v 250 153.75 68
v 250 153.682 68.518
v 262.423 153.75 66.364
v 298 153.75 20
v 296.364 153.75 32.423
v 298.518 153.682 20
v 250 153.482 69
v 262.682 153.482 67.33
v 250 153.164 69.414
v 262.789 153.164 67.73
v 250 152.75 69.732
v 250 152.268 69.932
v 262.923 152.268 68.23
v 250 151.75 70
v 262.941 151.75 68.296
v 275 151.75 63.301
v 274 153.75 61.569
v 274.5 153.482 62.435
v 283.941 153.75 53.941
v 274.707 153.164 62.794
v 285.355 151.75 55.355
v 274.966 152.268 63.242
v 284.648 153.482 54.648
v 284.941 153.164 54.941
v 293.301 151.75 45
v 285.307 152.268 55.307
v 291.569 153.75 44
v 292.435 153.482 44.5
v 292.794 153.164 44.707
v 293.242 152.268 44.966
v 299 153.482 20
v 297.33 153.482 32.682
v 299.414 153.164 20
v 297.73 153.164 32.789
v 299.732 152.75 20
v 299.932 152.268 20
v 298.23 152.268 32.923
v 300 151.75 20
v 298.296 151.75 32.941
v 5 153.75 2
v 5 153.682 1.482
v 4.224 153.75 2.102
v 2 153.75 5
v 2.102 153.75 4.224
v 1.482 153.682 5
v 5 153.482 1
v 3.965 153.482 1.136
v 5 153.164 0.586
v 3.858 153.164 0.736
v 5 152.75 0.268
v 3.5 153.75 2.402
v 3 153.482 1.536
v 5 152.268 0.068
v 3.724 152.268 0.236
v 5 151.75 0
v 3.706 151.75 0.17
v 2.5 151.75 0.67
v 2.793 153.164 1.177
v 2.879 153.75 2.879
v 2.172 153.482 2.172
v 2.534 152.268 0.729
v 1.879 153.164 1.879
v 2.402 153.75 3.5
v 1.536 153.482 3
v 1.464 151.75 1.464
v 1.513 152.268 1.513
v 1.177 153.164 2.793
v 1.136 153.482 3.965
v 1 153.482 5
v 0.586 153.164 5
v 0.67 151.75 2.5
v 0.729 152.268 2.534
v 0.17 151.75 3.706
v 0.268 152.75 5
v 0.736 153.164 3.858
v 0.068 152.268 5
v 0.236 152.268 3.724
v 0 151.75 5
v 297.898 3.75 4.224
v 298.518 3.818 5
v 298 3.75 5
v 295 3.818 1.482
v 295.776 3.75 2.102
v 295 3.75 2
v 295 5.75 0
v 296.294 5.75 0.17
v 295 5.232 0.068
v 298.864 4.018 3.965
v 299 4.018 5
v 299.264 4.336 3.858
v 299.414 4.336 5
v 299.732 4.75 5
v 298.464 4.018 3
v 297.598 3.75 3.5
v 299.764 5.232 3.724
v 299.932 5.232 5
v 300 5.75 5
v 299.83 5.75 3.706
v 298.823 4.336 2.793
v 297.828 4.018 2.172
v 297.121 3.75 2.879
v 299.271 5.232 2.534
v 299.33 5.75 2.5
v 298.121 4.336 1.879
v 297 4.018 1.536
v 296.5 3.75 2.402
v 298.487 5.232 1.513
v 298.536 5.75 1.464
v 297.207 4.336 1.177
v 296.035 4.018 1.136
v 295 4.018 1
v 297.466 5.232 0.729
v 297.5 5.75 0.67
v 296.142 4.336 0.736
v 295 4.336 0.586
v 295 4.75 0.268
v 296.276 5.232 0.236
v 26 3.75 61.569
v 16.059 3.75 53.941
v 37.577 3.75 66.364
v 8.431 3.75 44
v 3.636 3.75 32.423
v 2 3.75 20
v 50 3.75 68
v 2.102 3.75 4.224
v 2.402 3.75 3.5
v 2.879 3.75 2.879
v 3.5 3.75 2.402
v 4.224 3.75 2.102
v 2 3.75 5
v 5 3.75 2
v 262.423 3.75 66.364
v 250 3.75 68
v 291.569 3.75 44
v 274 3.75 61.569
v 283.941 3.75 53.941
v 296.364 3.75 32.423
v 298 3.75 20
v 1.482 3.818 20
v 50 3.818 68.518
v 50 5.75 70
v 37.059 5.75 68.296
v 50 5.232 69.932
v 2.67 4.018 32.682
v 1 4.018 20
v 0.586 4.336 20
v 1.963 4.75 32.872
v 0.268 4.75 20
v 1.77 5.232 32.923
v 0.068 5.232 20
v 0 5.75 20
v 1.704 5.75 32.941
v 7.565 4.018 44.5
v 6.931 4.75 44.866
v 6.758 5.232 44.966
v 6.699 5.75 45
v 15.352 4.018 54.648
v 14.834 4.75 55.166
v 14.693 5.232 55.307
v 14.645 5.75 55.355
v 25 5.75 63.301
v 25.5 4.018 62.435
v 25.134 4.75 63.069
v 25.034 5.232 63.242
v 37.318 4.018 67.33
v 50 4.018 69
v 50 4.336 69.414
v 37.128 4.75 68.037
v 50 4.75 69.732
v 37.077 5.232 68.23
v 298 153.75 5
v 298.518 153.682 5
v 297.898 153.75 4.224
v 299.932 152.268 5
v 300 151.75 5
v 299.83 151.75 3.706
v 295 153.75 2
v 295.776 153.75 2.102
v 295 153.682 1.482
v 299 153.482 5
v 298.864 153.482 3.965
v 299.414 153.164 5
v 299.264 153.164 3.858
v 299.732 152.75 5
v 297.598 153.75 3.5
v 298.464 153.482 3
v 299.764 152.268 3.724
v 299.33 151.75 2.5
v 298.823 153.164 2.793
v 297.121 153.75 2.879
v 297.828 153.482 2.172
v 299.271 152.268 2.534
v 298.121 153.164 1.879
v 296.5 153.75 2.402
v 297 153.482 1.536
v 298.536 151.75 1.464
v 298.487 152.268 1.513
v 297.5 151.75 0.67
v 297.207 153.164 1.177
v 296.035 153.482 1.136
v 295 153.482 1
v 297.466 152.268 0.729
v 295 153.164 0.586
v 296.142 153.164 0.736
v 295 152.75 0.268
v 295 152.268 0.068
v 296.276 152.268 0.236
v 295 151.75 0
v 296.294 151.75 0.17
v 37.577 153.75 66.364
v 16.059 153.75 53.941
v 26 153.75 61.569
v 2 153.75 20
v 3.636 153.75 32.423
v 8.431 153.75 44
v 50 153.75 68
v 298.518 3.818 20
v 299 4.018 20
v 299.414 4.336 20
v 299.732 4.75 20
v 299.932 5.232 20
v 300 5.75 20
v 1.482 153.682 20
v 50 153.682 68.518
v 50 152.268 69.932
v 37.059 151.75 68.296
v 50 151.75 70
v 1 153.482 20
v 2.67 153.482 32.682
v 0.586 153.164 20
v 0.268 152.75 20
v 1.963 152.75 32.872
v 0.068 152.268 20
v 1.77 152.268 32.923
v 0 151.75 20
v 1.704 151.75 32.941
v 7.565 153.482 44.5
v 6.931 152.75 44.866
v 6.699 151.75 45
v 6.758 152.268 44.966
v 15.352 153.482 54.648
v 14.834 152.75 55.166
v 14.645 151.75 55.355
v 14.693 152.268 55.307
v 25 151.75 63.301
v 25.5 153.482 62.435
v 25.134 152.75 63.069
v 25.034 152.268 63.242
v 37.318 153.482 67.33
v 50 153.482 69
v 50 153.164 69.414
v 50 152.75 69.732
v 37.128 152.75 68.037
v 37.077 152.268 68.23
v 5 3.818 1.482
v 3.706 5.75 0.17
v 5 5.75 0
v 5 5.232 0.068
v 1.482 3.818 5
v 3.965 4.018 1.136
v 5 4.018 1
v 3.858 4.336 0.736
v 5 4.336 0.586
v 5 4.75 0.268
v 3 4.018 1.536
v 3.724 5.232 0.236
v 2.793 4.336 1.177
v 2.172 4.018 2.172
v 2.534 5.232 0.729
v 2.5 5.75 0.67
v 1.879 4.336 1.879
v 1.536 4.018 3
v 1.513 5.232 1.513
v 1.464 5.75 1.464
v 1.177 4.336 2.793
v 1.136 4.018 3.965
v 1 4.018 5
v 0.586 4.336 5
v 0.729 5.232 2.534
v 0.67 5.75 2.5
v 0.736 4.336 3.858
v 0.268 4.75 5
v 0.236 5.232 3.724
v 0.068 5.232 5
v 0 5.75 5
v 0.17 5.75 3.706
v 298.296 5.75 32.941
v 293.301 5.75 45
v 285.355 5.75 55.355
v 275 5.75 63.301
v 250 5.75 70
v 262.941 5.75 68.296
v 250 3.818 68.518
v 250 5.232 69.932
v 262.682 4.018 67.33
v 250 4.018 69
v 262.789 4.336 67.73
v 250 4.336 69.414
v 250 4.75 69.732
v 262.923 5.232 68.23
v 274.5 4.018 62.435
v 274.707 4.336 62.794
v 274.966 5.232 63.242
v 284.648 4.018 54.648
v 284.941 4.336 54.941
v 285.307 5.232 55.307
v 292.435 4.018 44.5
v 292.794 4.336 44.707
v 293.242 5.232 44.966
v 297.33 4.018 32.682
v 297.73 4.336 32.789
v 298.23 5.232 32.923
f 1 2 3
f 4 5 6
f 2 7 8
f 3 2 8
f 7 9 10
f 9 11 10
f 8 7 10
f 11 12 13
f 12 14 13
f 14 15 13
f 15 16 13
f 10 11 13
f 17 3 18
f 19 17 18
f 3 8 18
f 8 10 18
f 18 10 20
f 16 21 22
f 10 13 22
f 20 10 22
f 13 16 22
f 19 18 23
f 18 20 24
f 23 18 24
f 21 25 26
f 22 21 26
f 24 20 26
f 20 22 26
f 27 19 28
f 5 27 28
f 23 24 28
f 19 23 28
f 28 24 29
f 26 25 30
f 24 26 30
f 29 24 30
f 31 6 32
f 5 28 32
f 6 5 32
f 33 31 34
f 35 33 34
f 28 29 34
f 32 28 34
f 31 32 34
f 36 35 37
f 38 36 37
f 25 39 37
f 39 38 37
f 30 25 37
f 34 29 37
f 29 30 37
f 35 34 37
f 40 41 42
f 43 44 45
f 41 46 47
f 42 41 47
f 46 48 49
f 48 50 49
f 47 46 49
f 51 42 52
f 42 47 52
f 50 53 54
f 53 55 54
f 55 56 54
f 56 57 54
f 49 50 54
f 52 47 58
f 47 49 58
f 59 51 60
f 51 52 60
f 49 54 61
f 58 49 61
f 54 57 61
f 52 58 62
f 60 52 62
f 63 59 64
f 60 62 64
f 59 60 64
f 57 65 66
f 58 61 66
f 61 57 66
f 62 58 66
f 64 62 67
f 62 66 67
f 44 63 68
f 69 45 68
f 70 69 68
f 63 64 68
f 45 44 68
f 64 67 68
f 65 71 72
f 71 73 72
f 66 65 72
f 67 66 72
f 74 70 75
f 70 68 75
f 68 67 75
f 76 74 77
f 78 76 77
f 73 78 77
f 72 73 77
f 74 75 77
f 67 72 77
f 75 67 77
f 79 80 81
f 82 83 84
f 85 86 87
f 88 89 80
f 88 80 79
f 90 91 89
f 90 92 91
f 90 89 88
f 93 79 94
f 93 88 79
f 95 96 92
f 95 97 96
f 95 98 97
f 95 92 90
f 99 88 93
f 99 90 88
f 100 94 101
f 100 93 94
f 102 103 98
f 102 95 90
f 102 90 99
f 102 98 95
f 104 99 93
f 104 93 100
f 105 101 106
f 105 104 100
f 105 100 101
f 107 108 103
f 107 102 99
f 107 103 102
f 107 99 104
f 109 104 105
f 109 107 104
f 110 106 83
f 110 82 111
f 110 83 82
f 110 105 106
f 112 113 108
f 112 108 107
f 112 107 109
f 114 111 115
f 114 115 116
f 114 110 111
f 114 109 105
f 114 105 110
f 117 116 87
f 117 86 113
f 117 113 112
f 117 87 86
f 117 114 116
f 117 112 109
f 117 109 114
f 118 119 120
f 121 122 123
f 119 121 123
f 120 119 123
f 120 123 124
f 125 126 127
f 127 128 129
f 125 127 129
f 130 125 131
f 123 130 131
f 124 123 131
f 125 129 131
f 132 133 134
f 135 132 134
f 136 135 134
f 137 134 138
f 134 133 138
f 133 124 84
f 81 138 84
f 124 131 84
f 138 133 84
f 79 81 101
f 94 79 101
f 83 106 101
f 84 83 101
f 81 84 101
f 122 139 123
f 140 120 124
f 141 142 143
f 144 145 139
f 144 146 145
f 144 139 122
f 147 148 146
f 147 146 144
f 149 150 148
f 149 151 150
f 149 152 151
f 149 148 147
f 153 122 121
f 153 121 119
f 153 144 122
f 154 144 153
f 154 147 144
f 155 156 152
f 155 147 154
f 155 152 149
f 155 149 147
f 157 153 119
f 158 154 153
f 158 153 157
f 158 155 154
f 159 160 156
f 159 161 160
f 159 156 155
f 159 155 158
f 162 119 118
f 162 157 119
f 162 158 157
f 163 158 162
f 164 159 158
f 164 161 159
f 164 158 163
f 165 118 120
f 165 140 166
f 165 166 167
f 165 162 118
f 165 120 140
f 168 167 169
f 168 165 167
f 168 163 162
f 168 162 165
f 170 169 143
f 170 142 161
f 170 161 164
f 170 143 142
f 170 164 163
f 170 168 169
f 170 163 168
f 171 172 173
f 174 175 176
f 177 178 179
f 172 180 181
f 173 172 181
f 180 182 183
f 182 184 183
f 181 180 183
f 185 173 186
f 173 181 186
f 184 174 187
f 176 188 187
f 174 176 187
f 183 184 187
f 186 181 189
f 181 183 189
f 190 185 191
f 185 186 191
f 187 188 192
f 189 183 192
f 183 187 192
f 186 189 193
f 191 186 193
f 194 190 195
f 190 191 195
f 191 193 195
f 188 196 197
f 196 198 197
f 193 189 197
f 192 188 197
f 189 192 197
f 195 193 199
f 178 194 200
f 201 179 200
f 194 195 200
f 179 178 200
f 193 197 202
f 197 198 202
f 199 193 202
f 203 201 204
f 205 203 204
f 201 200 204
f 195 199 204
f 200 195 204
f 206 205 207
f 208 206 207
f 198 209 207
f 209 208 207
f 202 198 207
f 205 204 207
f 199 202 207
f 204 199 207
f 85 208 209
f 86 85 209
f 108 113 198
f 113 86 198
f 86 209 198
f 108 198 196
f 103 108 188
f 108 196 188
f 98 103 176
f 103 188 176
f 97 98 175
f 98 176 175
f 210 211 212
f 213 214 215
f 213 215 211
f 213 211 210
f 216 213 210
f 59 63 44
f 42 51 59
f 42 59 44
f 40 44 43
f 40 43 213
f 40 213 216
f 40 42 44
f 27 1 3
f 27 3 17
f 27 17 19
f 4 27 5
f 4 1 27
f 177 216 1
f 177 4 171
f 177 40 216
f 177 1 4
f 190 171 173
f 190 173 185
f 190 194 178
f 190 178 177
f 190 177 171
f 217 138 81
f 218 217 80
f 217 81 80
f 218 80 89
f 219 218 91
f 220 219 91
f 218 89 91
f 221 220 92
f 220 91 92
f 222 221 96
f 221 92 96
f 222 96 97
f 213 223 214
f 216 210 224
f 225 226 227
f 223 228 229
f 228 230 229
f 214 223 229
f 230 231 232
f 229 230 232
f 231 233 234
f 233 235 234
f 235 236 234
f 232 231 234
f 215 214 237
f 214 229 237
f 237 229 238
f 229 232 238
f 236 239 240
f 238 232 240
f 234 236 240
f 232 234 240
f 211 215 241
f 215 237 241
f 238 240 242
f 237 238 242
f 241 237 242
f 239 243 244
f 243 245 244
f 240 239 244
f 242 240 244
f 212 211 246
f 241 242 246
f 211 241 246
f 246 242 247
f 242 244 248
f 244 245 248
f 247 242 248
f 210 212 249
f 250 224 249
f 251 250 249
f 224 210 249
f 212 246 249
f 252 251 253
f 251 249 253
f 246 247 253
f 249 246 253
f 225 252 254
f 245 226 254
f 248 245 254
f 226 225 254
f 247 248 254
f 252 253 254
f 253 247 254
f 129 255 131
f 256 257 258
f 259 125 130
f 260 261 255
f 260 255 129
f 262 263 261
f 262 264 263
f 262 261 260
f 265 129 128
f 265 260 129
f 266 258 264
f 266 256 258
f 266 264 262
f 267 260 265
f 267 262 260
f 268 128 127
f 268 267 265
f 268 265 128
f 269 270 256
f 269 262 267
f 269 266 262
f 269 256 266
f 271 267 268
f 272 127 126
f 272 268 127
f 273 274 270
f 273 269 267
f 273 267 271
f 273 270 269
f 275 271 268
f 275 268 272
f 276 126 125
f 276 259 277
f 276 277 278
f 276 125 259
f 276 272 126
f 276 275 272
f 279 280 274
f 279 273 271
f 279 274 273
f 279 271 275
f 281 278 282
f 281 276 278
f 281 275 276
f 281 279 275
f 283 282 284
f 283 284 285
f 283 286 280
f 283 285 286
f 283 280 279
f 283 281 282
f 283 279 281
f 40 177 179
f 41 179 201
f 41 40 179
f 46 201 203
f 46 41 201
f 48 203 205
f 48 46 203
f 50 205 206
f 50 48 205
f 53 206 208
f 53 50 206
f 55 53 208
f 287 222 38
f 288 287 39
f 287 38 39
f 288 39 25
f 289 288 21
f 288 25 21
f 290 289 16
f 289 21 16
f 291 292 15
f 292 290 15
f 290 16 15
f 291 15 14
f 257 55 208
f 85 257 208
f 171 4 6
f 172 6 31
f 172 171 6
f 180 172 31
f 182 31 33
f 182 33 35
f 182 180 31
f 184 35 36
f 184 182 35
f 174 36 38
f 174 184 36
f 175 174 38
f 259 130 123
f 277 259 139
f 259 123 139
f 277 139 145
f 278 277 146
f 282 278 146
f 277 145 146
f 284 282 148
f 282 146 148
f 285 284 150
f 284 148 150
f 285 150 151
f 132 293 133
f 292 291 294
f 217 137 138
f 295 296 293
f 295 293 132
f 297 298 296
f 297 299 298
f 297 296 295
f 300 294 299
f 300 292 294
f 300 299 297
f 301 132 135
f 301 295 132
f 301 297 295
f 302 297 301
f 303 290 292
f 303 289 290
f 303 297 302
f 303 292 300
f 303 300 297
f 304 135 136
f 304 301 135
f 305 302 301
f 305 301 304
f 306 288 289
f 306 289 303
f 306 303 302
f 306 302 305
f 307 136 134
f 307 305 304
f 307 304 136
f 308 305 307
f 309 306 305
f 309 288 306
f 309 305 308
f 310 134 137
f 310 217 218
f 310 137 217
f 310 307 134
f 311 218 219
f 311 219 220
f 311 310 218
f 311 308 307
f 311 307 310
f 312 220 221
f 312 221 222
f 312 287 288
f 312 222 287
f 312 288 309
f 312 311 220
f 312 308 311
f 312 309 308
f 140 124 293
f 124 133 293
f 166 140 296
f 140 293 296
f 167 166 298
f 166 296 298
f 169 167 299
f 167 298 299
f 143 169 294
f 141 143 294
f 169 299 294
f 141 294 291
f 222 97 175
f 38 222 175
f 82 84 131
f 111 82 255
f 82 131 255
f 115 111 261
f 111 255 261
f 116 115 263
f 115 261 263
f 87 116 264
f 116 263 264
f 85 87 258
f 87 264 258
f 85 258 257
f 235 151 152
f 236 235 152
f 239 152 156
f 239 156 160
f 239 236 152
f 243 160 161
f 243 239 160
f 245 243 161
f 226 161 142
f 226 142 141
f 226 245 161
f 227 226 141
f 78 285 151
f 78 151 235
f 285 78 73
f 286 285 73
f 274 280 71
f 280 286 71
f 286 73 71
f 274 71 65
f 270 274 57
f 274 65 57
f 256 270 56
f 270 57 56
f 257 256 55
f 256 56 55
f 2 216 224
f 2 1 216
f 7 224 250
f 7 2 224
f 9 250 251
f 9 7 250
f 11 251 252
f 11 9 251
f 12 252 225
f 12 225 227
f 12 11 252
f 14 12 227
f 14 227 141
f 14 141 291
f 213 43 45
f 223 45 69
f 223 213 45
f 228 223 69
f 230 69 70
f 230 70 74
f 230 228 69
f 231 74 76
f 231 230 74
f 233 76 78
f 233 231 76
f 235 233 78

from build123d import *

# Parameters (mm, degrees)
F0_W     = 300
F0_H     = 150
F1_DEPTH = 70
F2_R     = 50
F3_R     = 5
F4_R     = 2


with BuildPart() as f1:
    # F0 (on Top) → F1 (new body)
    with BuildSketch(Plane.XY):
        with Locations((150, 78.7498958572)):
            Rectangle(F0_W, F0_H)
    extrude(amount=F1_DEPTH)

    # F2
    f2_edges = [f1.edges().sort_by_distance(p)[0] for p in [
        (0, 78.749896, 70),
        (300, 78.749896, 70),
    ]]
    fillet(f2_edges, radius=F2_R)

    # F3
    f3_edges = [f1.edges().sort_by_distance(p)[0] for p in [
        (0, 78.749896, 0),
        (300, 78.749896, 0),
    ]]
    fillet(f3_edges, radius=F3_R)

    # F4
    f4_edges = [f1.edges().sort_by_distance(p)[0] for p in [
        (150, 3.749896, 70),
        (150, 153.749896, 70),
        (150, 3.749896, 0),
        (150, 153.749896, 0),
        (300, 3.749896, 12.5),
        (300, 153.749896, 12.5),
        (0, 3.749896, 12.5),
        (1.464466, 3.749896, 1.464466),
        (14.644661, 3.749896, 55.355339),
        (298.535534, 3.749896, 1.464466),
        (285.355339, 3.749896, 55.355339),
        (298.535534, 153.749896, 1.464466),
        (285.355339, 153.749896, 55.355339),
        (1.464466, 153.749896, 1.464466),
        (14.644661, 153.749896, 55.355339),
        (0, 153.749896, 12.5),
    ]]
    fillet(f4_edges, radius=F4_R)


solid = f1.part
